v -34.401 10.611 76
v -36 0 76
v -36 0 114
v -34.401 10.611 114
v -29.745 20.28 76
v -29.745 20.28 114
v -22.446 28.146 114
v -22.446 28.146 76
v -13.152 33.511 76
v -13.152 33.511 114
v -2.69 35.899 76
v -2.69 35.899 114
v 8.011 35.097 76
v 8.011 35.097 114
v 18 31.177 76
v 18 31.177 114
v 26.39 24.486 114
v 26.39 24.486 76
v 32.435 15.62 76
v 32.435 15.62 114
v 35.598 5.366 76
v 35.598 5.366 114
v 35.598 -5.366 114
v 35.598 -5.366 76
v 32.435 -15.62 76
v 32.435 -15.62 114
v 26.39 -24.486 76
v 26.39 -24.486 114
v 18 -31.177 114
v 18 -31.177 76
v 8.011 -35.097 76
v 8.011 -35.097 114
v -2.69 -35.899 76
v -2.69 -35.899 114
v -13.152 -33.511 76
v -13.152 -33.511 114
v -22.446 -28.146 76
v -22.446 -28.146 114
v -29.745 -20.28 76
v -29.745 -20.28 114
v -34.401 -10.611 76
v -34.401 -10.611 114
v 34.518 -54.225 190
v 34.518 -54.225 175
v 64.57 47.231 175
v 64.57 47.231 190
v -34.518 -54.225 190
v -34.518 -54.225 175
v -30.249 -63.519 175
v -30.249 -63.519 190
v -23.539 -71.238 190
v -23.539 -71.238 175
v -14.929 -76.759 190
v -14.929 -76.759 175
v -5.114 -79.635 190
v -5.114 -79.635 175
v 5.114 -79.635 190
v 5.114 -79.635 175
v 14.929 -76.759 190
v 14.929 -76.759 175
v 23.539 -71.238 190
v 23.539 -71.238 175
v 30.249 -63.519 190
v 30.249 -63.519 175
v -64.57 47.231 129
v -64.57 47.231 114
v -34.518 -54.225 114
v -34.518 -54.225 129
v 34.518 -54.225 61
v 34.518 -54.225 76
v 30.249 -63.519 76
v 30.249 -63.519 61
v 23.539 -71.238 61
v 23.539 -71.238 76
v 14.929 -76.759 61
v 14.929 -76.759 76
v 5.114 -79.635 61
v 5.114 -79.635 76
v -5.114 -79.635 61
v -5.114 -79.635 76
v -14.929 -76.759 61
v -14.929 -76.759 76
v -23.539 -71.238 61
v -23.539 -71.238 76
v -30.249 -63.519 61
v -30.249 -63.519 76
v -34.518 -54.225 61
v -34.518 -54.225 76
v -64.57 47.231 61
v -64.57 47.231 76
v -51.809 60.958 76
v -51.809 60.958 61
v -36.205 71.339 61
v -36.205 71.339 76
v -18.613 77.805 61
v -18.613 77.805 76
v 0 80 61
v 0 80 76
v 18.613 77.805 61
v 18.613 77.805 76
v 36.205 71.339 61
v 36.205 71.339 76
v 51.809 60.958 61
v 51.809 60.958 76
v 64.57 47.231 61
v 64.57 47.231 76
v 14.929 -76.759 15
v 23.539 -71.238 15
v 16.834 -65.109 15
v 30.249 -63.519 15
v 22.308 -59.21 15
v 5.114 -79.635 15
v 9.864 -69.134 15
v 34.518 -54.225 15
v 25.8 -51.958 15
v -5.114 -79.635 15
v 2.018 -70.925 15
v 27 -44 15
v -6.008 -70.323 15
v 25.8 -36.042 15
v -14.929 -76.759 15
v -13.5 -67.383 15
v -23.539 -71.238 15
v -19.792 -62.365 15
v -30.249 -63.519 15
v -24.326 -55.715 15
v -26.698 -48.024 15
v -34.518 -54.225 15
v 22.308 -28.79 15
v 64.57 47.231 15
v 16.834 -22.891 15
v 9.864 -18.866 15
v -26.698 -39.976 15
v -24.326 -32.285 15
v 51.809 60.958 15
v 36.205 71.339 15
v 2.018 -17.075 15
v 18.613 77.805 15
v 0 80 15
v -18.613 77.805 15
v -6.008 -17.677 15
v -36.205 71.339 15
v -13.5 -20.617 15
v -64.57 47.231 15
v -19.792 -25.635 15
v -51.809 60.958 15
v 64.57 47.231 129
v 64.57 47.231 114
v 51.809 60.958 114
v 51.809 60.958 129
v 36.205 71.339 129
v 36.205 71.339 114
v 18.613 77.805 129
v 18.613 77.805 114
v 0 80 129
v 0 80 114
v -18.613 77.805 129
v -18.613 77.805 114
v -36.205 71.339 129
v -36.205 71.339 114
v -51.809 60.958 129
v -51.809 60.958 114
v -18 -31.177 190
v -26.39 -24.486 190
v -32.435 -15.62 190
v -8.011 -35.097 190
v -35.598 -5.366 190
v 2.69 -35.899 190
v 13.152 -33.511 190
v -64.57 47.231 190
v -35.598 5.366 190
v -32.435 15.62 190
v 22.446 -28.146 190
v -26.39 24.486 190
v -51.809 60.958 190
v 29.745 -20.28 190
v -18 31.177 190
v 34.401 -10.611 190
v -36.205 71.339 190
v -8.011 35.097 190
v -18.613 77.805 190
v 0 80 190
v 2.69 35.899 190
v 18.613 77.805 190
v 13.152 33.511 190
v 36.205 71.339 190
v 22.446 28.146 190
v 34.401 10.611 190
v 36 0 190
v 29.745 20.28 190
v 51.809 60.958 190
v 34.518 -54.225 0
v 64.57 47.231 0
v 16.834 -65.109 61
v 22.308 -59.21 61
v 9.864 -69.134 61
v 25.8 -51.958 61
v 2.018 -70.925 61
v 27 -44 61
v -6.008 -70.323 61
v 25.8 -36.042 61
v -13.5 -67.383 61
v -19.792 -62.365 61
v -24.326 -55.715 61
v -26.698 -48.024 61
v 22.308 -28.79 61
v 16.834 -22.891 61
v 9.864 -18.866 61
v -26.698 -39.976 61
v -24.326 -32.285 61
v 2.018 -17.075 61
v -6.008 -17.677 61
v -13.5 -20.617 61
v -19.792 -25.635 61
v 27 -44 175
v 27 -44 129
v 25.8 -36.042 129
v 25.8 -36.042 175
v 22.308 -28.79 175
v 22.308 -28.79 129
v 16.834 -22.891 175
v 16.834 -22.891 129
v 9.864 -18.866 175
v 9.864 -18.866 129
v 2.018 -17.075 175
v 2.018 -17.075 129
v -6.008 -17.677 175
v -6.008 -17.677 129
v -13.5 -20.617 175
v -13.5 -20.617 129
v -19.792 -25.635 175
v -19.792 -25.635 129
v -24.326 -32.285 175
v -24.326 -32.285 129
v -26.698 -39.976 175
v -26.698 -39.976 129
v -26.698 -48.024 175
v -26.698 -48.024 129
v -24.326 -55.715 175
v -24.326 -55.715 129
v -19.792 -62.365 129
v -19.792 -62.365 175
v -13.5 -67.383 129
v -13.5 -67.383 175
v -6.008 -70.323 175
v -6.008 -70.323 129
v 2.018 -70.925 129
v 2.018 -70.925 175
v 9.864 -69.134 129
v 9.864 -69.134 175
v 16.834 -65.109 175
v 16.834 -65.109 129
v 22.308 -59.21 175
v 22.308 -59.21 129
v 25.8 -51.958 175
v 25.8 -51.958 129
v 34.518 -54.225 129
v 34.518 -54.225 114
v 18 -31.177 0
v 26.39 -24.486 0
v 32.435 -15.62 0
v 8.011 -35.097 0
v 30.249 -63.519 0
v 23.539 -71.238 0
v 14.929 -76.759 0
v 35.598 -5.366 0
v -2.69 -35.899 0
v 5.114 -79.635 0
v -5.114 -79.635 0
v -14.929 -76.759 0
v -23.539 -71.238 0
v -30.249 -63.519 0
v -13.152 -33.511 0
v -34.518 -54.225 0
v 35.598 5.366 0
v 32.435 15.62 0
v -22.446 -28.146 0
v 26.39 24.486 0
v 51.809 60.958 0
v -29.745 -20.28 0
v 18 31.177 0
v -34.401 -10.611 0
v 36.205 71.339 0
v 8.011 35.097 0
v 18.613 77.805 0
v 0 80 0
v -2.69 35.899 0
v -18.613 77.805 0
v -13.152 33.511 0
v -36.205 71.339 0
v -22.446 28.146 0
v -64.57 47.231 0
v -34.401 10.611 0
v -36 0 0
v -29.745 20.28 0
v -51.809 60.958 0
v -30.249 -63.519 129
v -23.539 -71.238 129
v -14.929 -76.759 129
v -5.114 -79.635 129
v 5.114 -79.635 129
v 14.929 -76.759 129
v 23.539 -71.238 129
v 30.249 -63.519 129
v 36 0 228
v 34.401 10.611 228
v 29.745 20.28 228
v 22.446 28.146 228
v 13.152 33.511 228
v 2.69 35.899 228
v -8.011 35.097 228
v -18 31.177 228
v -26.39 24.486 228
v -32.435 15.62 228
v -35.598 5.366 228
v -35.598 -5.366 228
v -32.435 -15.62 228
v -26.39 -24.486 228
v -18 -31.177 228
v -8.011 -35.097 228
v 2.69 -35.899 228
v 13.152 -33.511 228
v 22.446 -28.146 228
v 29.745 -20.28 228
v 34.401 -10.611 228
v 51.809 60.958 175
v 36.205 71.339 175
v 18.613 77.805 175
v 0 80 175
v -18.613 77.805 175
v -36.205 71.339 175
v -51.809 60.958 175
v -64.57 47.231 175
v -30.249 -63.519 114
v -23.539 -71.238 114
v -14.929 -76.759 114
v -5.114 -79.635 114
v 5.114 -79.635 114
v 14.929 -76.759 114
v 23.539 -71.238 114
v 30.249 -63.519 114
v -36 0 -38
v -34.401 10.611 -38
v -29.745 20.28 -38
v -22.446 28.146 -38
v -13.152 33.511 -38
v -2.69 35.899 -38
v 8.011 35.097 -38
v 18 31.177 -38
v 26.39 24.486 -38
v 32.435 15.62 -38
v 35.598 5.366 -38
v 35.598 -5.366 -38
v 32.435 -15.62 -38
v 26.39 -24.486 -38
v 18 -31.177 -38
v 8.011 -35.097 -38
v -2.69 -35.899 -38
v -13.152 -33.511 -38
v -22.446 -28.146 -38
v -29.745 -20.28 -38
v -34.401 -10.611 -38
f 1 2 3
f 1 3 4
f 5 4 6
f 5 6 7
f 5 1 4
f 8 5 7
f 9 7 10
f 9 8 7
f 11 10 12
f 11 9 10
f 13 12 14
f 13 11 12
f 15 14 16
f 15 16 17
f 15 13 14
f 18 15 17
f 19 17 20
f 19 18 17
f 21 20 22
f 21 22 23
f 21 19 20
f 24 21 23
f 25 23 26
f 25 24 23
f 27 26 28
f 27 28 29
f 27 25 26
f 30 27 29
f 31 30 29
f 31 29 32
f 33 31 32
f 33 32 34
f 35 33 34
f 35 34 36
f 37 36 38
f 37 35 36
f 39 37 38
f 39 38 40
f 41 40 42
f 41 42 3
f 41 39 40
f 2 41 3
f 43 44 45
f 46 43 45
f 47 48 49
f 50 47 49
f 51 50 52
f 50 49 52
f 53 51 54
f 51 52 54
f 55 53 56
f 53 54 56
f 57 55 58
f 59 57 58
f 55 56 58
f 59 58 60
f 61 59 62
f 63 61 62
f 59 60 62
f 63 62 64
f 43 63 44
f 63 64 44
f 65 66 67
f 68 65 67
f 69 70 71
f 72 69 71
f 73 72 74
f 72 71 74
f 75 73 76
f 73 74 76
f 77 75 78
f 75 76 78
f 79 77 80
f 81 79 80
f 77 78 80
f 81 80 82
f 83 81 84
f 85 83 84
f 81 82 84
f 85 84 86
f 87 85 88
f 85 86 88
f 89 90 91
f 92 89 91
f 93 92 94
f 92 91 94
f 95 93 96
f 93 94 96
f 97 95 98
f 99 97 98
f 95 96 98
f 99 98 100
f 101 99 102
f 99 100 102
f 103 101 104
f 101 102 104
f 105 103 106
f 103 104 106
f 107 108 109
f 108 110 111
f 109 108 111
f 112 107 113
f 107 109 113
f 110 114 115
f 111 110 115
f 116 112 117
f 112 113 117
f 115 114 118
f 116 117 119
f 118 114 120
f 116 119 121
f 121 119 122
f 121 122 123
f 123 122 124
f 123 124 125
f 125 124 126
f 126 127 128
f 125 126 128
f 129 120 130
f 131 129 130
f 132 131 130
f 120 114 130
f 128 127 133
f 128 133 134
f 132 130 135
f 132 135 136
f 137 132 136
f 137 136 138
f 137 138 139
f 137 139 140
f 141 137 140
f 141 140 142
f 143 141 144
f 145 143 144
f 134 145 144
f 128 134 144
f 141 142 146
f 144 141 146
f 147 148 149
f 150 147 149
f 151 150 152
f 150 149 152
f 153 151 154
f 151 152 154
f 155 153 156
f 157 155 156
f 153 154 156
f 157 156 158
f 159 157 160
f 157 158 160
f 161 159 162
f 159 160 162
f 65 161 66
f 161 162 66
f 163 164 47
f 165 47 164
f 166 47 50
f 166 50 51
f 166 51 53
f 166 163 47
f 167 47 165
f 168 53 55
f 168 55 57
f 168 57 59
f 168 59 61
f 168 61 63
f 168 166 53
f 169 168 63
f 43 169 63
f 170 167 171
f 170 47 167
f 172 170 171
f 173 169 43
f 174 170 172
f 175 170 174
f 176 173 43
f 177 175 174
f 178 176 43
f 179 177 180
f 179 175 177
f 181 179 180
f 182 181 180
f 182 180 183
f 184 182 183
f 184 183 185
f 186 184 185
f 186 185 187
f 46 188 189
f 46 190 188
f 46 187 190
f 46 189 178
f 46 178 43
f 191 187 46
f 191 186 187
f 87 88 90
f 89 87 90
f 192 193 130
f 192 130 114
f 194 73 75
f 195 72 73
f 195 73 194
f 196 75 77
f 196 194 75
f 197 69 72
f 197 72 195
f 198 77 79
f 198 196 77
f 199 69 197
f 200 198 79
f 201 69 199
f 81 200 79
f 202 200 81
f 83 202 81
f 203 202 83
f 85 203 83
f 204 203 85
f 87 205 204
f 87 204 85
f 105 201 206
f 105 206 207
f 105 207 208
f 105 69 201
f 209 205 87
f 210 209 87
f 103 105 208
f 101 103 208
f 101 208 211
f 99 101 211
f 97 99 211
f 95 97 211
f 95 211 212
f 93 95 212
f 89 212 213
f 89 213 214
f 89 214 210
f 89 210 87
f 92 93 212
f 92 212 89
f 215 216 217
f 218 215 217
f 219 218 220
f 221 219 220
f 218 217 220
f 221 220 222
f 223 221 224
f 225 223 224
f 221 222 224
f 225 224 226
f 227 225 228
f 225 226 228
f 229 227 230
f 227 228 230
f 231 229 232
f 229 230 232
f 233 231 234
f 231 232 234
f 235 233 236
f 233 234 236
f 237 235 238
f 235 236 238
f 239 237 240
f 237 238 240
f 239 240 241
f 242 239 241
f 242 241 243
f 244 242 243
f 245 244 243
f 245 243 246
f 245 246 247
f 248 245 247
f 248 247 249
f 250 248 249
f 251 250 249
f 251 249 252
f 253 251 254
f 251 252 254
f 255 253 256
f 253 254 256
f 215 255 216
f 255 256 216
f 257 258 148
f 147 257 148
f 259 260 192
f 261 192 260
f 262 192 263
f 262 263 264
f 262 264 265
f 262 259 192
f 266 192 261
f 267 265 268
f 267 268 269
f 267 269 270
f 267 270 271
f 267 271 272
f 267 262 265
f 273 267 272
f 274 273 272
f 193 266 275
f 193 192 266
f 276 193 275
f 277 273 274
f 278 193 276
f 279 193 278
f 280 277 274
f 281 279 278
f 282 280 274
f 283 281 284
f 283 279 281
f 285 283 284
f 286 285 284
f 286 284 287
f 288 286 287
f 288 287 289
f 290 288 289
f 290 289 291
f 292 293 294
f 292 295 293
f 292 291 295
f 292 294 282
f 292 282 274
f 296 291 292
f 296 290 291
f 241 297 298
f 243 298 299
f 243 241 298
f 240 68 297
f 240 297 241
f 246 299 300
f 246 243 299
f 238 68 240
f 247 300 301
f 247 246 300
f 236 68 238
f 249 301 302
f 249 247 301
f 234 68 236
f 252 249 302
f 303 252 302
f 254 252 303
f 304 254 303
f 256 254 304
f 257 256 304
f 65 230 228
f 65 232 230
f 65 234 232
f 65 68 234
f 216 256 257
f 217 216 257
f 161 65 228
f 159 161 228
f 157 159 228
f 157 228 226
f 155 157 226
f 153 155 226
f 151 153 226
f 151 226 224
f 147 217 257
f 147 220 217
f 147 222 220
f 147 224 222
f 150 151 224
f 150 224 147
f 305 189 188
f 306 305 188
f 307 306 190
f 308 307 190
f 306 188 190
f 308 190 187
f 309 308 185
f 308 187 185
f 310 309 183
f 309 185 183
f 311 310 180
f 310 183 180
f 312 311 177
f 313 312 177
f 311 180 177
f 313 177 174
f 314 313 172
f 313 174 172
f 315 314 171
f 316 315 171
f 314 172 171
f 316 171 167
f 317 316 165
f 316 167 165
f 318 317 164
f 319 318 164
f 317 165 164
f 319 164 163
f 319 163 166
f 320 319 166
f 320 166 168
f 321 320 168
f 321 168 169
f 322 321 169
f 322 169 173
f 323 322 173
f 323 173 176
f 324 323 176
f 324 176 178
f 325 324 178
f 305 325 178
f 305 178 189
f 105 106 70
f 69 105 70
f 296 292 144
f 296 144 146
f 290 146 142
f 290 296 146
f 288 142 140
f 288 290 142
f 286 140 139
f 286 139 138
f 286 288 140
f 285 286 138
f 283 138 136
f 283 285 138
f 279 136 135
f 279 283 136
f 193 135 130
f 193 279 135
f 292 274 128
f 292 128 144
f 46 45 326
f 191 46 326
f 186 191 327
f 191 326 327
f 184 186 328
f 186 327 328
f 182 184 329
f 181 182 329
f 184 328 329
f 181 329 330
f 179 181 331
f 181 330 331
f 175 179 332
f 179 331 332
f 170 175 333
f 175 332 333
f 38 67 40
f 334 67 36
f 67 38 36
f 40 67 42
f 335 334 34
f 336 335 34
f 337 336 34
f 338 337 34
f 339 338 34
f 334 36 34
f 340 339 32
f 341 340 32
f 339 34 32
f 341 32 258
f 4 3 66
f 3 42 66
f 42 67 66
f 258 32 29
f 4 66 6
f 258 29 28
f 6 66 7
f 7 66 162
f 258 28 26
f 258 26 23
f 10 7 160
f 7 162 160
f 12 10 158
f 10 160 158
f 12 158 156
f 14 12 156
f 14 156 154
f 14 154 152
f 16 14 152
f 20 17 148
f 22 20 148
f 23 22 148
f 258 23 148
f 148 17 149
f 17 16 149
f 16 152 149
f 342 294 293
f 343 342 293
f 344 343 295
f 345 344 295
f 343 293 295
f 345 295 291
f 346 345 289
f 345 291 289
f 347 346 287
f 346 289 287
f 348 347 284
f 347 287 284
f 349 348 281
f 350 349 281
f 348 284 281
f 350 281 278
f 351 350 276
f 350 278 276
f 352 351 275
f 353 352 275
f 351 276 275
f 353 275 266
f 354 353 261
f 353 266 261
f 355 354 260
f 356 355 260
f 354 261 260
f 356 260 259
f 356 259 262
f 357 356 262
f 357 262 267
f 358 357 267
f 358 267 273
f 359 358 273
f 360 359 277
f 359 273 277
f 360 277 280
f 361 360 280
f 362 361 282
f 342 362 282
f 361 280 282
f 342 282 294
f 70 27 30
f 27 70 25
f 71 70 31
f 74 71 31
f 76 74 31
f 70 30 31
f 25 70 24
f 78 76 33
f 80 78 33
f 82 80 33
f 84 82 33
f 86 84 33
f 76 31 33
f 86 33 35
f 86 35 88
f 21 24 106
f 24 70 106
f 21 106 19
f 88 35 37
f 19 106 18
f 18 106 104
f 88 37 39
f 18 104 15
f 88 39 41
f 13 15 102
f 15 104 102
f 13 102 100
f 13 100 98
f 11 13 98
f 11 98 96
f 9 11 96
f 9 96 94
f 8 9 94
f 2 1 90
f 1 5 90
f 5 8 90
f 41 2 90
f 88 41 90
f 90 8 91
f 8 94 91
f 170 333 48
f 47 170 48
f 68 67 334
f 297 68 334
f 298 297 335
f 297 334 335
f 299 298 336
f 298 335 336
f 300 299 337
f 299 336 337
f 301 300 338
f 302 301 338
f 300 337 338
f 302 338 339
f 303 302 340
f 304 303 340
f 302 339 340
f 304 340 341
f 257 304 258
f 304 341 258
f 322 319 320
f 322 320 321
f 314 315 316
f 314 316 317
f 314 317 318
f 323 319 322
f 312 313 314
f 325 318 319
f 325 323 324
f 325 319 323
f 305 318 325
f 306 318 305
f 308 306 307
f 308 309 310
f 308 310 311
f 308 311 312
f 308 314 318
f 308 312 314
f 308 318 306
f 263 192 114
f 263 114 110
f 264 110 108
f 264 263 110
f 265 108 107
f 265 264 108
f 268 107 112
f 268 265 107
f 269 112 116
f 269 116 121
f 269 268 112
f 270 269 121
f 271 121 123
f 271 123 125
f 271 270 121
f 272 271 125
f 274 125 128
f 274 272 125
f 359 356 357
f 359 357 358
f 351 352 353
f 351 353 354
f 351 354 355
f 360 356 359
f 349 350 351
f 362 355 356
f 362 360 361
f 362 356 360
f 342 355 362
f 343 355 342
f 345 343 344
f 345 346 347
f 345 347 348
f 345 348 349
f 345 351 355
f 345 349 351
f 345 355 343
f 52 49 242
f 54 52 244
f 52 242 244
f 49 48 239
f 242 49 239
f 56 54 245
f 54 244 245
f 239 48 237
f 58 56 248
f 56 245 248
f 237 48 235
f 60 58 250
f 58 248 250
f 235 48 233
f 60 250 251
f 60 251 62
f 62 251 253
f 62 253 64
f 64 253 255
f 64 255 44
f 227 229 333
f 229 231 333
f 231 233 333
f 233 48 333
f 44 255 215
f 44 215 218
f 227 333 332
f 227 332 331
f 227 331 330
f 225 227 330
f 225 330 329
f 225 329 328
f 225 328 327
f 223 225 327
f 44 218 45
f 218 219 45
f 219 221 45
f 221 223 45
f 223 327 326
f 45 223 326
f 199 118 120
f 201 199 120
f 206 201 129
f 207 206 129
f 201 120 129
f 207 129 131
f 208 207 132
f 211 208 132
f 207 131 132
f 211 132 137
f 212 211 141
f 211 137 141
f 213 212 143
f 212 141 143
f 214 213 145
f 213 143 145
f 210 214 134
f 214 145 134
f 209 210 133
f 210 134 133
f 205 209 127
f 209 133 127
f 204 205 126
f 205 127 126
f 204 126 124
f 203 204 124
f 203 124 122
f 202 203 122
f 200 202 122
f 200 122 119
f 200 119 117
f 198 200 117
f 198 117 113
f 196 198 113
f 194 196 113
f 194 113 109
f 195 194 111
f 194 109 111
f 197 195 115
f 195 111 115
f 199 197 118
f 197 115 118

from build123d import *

# Parameters (mm, degrees)
BOSS_EXTRUDE2_DEPTH     = 15
SKETCH3_R               = 27
BOSS_EXTRUDE3_DEPTH     = 46
SKETCH4_R               = 36
BOSS_EXTRUDE4_DEPTH     = 38
MIRROR3_COPY_1_DEPTH    = 15
MIRROR3_COPY_2_SKETCH_R = 27
MIRROR3_COPY_2_DEPTH    = 46
MIRROR3_COPY_3_SKETCH_R = 36
MIRROR3_COPY_3_DEPTH    = 38
MIRROR3_COPY_4_DEPTH    = 15
MIRROR3_COPY_5_SKETCH_R = 27
MIRROR3_COPY_5_DEPTH    = 46
MIRROR3_COPY_6_SKETCH_R = 36
MIRROR3_COPY_6_DEPTH    = 38


with BuildPart() as part:
    # Sketch2 → Boss-Extrude2 (new body)
    with BuildSketch(Plane.XY):
        with BuildLine():
            Line((64.569893475, 47.23059238), (34.517510455, -54.224552409))
            ThreePointArc((34.517510455, -54.224552409), (0, -80), (-34.517510455, -54.224552409))
            Line((-34.517510455, -54.224552409), (-64.569893475, 47.23059238))
            ThreePointArc((-64.569893475, 47.23059238), (0, 80), (64.569893475, 47.23059238))
        make_face()
    boss_extrude2 = extrude(amount=BOSS_EXTRUDE2_DEPTH)

    # Sketch3 → Boss-Extrude3 (add)
    with BuildSketch(Plane.XY.offset(15)):
        with Locations((0, -44)):
            Circle(SKETCH3_R)
    boss_extrude3 = extrude(amount=BOSS_EXTRUDE3_DEPTH)

    # Sketch4 → Boss-Extrude4 (add)
    with BuildSketch(Plane(origin=(0, 0, 0), x_dir=(-1, 0, 0), z_dir=(0, 0, -1))):
        Circle(SKETCH4_R)
    boss_extrude4 = extrude(amount=BOSS_EXTRUDE4_DEPTH)

    # Mirror2: Boss-Extrude2, Boss-Extrude3, Boss-Extrude4 across plane
    add(boss_extrude2.mirror(Plane.XY.offset(38)))
    add(boss_extrude3.mirror(Plane.XY.offset(38)))
    add(boss_extrude4.mirror(Plane.XY.offset(38)))

    # Mirror3 copy 1 sketch → Mirror3 copy 1 (add)
    with BuildSketch(Plane.XY.offset(114)):
        with BuildLine():
            Line((64.569893475, 47.23059238), (34.517510455, -54.224552409))
            ThreePointArc((34.517510455, -54.224552409), (0, -80), (-34.517510455, -54.224552409))
            Line((-34.517510455, -54.224552409), (-64.569893475, 47.23059238))
            ThreePointArc((-64.569893475, 47.23059238), (0, 80), (64.569893475, 47.23059238))
        make_face()
    extrude(amount=MIRROR3_COPY_1_DEPTH)

    # Mirror3 copy 2 sketch → Mirror3 copy 2 (add)
    with BuildSketch(Plane.XY.offset(129)):
        with Locations((0, -44)):
            Circle(MIRROR3_COPY_2_SKETCH_R)
    extrude(amount=MIRROR3_COPY_2_DEPTH)

    # Mirror3 copy 3 sketch → Mirror3 copy 3 (add)
    with BuildSketch(Plane(origin=(0, 0, 114), x_dir=(-1, 0, 0), z_dir=(0, 0, -1))):
        Circle(MIRROR3_COPY_3_SKETCH_R)
    extrude(amount=MIRROR3_COPY_3_DEPTH)

    # Mirror3 copy 4 sketch → Mirror3 copy 4 (add)
    with BuildSketch(Plane(origin=(0, 0, 190), x_dir=(1, 0, 0), z_dir=(0, 0, -1))):
        with BuildLine():
            Line((64.569893475, -47.23059238), (34.517510455, 54.224552409))
            ThreePointArc((34.517510455, 54.224552409), (0, 80), (-34.517510455, 54.224552409))
            Line((-34.517510455, 54.224552409), (-64.569893475, -47.23059238))
            ThreePointArc((-64.569893475, -47.23059238), (0, -80), (64.569893475, -47.23059238))
        make_face()
    extrude(amount=MIRROR3_COPY_4_DEPTH)

    # Mirror3 copy 5 sketch → Mirror3 copy 5 (add)
    with BuildSketch(Plane(origin=(0, 0, 175), x_dir=(1, 0, 0), z_dir=(0, 0, -1))):
        with Locations((0, 44)):
            Circle(MIRROR3_COPY_5_SKETCH_R)
    extrude(amount=MIRROR3_COPY_5_DEPTH)

    # Mirror3 copy 6 sketch → Mirror3 copy 6 (add)
    with BuildSketch(Plane(origin=(0, 0, 190), x_dir=(-1, 0, 0), z_dir=(0, 0, 1))):
        Circle(MIRROR3_COPY_6_SKETCH_R)
    extrude(amount=MIRROR3_COPY_6_DEPTH)


solid = part.part
